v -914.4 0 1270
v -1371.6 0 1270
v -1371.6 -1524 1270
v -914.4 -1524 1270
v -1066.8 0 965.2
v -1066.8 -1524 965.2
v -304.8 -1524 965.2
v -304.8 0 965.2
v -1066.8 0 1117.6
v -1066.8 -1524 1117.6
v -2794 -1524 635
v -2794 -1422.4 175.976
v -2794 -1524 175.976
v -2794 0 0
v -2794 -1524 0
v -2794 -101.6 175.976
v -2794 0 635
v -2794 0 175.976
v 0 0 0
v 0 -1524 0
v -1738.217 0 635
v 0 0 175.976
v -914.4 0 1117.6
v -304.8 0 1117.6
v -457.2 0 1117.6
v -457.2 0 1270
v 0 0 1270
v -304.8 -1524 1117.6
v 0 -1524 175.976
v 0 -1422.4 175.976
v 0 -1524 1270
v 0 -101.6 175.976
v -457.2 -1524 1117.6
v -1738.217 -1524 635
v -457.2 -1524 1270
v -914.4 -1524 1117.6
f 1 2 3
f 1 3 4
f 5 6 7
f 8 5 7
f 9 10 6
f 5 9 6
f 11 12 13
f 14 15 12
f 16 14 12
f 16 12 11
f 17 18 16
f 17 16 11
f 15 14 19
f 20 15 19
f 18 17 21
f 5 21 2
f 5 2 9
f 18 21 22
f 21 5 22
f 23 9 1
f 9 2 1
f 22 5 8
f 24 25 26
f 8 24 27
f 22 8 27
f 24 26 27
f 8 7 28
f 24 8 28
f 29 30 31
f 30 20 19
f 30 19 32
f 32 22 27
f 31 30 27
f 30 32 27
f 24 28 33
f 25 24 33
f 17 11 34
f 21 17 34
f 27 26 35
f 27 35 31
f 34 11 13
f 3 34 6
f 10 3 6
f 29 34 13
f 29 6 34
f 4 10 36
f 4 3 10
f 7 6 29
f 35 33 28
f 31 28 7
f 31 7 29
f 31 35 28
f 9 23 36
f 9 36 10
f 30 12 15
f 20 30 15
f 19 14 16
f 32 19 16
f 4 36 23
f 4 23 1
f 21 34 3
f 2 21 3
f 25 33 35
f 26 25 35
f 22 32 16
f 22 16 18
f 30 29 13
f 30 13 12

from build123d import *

# Parameters (mm, degrees)
F0_W     = 2794
F0_H     = 1270
F1_DEPTH = 1524
F2_W     = 457.2
F2_H     = 152.4
F3_DEPTH = 1524.001
F5_DEPTH = 1524.001
F7_DEPTH = 2794.001


with BuildPart() as f1:
    # F0 (on Front) → F1 (new body)
    with BuildSketch(Plane.XZ):
        with Locations((-1397, 635)):
            Rectangle(F0_W, F0_H)
    extrude(amount=F1_DEPTH)

    # F2 (on face) → F3 (cut, through all)
    with BuildSketch(Plane.XZ.offset(1524)):
        Polygon((-1066.8, 965.2), (-304.8, 965.2), (-304.8, 1117.6), (-457.2, 1117.6), (-914.4, 1117.6), (-1066.8, 1117.6), align=None)
        with Locations((-685.8, 1193.8)):
            Rectangle(F2_W, F2_H)
    extrude(amount=-F3_DEPTH, mode=Mode.SUBTRACT)

    # F4 (on face) → F5 (cut, through all)
    with BuildSketch(Plane.XZ.offset(1524)):
        Polygon((-1738.217421, 635), (-1371.6, 1270), (-2794, 1270), (-2794, 635), align=None)
    extrude(amount=-F5_DEPTH, mode=Mode.SUBTRACT)

    # F6 (on face) → F7 (cut, through all)
    with BuildSketch(Plane(origin=(-2794, 0, 0), x_dir=(0, -1, 0), z_dir=(-1, 0, 0))):
        Polygon((0, 175.976362), (0, 0), (101.6, 175.976362), align=None)
        Polygon((1422.4, 175.976362), (1524, 0), (1524, 175.976362), align=None)
    extrude(amount=-F7_DEPTH, mode=Mode.SUBTRACT)


solid = f1.part
